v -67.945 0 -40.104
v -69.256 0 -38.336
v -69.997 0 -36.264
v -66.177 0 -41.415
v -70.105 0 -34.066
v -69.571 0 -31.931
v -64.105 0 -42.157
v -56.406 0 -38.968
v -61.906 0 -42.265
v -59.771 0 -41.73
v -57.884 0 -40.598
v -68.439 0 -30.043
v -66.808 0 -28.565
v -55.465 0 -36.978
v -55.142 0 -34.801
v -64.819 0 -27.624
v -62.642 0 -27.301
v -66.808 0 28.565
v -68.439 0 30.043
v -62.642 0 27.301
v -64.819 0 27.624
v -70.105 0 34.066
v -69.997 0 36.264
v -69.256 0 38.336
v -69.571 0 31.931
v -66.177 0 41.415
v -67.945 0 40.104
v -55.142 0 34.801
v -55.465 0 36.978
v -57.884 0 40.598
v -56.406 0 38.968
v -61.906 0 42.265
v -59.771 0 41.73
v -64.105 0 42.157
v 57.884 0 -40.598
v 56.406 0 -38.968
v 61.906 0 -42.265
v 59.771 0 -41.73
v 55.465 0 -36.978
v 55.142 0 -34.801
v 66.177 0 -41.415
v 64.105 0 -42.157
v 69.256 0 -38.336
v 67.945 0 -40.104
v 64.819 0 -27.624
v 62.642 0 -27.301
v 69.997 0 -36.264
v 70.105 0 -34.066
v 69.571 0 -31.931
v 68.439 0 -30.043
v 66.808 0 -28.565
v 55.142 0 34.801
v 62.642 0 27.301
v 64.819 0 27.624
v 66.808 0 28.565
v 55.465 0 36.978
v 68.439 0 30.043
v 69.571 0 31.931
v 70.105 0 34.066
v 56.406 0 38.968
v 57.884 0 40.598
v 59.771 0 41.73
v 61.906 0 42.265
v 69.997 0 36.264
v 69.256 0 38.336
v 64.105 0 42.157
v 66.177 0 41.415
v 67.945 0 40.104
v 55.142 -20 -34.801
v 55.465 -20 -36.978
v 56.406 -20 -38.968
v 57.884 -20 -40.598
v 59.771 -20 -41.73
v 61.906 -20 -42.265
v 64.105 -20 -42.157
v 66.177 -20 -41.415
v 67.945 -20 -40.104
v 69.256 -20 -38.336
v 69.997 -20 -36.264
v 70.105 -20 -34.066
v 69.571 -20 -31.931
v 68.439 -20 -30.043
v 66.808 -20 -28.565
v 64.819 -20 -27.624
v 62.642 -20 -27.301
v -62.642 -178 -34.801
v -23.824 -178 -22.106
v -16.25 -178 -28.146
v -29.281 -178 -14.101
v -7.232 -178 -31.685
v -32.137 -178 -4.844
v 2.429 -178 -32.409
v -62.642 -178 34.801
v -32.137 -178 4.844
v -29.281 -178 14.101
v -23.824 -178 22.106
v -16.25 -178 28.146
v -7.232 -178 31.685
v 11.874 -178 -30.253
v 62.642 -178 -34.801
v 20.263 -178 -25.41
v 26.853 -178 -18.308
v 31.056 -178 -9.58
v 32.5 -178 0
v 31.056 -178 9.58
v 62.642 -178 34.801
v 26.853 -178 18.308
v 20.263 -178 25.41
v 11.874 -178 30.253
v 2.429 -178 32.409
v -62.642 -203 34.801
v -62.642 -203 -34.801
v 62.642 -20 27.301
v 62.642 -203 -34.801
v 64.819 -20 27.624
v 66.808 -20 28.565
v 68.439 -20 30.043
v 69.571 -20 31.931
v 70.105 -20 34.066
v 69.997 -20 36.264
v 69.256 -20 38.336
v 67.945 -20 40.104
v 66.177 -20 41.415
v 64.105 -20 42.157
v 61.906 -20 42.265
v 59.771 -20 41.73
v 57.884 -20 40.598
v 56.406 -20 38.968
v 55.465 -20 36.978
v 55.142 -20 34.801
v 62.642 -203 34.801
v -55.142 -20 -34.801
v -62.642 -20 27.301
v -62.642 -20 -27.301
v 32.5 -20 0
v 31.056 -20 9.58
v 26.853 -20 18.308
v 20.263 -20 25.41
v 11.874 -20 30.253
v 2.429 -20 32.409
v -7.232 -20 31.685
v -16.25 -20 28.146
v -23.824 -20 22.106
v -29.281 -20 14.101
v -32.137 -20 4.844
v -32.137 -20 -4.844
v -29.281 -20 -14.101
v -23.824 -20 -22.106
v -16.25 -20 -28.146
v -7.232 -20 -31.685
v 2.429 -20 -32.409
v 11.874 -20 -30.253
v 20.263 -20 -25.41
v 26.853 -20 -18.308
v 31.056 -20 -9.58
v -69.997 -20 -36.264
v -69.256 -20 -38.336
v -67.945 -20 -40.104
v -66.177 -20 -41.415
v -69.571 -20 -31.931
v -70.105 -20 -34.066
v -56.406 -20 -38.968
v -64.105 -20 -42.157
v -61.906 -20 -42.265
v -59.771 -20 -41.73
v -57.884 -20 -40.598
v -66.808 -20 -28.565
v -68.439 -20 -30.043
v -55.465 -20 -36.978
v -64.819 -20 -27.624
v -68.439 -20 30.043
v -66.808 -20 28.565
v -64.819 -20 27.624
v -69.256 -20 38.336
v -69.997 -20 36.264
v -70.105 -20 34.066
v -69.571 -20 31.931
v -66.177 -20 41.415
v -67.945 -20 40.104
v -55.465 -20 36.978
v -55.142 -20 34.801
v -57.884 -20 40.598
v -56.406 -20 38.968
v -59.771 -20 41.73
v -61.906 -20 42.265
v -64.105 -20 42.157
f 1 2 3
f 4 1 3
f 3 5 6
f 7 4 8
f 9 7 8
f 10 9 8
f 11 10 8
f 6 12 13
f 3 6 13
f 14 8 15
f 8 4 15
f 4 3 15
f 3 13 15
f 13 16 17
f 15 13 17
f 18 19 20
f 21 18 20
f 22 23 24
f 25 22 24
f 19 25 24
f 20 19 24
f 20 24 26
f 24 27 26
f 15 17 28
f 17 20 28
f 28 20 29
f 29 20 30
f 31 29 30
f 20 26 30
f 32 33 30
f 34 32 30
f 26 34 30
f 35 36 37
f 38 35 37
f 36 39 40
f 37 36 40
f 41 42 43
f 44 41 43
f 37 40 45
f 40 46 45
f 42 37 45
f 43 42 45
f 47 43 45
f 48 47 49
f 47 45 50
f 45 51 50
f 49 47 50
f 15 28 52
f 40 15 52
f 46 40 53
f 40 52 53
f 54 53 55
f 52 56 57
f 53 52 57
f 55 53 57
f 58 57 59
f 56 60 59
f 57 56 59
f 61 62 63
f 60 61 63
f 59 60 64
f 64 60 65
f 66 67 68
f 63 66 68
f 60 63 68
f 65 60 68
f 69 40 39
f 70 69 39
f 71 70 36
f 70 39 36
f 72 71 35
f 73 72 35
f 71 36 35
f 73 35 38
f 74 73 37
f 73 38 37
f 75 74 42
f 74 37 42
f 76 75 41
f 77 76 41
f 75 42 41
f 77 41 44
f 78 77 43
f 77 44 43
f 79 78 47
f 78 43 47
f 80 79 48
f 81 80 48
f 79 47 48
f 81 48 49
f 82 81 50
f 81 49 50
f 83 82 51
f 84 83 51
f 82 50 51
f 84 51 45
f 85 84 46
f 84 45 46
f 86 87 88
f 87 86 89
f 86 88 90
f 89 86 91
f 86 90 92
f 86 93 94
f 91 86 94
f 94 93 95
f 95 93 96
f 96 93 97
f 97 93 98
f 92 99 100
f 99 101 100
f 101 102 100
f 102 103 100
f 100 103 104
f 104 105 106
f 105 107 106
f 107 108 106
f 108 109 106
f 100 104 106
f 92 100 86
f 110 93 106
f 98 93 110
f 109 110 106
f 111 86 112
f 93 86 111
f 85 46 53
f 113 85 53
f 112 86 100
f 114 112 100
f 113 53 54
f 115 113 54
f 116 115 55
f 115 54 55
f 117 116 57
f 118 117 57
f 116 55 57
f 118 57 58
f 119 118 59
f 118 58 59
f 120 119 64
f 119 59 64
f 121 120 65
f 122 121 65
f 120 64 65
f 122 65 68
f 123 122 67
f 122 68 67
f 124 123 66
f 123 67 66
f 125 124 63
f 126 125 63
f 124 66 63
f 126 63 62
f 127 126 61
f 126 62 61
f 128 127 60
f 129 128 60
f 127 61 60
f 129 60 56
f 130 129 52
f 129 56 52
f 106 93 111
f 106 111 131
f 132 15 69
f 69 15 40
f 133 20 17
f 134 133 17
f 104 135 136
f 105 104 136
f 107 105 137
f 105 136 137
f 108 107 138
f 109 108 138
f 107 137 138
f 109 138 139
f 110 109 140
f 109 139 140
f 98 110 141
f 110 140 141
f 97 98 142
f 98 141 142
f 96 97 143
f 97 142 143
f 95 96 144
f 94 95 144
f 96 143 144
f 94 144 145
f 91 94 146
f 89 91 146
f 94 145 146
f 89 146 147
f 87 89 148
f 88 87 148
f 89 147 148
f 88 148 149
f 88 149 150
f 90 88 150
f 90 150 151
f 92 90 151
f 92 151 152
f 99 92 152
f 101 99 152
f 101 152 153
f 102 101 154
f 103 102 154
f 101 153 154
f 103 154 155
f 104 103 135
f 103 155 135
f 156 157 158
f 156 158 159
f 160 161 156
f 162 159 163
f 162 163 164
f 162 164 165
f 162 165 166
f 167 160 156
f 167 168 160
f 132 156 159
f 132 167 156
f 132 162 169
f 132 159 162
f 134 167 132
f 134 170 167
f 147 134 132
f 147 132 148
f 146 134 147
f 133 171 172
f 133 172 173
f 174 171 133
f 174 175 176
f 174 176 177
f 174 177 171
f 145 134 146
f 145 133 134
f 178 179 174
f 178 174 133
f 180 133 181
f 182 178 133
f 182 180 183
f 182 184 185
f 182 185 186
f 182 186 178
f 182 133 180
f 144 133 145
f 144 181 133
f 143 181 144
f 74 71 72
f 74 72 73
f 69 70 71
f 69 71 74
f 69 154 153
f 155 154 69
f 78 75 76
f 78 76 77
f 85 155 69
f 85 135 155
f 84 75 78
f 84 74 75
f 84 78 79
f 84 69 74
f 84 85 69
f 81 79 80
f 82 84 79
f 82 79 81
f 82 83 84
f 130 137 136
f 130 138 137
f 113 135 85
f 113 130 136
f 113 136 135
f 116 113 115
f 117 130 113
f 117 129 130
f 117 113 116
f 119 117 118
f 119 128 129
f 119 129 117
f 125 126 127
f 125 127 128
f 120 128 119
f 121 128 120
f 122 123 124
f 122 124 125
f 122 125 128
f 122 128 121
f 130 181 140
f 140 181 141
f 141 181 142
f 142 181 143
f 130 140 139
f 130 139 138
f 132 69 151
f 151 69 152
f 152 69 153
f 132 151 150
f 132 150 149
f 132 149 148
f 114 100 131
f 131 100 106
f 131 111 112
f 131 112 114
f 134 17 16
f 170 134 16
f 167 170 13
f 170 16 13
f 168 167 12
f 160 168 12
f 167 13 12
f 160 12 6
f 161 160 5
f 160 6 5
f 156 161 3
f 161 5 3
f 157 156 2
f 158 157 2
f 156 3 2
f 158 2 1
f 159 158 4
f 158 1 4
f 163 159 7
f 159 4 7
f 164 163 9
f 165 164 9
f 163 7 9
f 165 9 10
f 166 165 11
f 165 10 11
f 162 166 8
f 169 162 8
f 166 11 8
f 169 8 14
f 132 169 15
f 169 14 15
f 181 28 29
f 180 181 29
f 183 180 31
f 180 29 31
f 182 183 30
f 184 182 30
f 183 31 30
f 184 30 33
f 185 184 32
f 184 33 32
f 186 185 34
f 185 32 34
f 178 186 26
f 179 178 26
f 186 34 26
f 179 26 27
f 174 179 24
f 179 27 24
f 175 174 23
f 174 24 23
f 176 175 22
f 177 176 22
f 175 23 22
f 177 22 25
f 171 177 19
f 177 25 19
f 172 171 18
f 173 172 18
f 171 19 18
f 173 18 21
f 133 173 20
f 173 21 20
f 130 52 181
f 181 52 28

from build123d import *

# Parameters (mm, degrees)
F1_DEPTH = 20
F2_R     = 32.5
F3_DEPTH = 158
F4_W     = 125.283194
F4_H     = 69.601772
F5_DEPTH = 25


with BuildPart() as f1:
    # F0 (on Front) → F1 (new body)
    with BuildSketch(Plane.XZ):
        with BuildLine():
            ThreePointArc((62.641597, 27.300886), (67.944897, 40.104186), (55.141597, 34.800886))
            Line((55.141597, 34.800886), (-55.141597, 34.800886))
            ThreePointArc((-55.141597, 34.800886), (-67.944897, 40.104186), (-62.641597, 27.300886))
            Line((-62.641597, 27.300886), (-62.641597, -27.300886))
            ThreePointArc((-62.641597, -27.300886), (-67.944897, -40.104186), (-55.141597, -34.800886))
            Line((-55.141597, -34.800886), (55.141597, -34.800886))
            ThreePointArc((55.141597, -34.800886), (67.944897, -40.104186), (62.641597, -27.300886))
            Line((62.641597, -27.300886), (62.641597, 27.300886))
        make_face()
    extrude(amount=F1_DEPTH)

    # F2 (on face) → F3 (join)
    with BuildSketch(Plane.XZ.offset(20)):
        Circle(F2_R)
    extrude(amount=F3_DEPTH)

    # F4 (on face) → F5 (join)
    with BuildSketch(Plane.XZ.offset(178)):
        Rectangle(F4_W, F4_H)
    extrude(amount=F5_DEPTH)


solid = f1.part
